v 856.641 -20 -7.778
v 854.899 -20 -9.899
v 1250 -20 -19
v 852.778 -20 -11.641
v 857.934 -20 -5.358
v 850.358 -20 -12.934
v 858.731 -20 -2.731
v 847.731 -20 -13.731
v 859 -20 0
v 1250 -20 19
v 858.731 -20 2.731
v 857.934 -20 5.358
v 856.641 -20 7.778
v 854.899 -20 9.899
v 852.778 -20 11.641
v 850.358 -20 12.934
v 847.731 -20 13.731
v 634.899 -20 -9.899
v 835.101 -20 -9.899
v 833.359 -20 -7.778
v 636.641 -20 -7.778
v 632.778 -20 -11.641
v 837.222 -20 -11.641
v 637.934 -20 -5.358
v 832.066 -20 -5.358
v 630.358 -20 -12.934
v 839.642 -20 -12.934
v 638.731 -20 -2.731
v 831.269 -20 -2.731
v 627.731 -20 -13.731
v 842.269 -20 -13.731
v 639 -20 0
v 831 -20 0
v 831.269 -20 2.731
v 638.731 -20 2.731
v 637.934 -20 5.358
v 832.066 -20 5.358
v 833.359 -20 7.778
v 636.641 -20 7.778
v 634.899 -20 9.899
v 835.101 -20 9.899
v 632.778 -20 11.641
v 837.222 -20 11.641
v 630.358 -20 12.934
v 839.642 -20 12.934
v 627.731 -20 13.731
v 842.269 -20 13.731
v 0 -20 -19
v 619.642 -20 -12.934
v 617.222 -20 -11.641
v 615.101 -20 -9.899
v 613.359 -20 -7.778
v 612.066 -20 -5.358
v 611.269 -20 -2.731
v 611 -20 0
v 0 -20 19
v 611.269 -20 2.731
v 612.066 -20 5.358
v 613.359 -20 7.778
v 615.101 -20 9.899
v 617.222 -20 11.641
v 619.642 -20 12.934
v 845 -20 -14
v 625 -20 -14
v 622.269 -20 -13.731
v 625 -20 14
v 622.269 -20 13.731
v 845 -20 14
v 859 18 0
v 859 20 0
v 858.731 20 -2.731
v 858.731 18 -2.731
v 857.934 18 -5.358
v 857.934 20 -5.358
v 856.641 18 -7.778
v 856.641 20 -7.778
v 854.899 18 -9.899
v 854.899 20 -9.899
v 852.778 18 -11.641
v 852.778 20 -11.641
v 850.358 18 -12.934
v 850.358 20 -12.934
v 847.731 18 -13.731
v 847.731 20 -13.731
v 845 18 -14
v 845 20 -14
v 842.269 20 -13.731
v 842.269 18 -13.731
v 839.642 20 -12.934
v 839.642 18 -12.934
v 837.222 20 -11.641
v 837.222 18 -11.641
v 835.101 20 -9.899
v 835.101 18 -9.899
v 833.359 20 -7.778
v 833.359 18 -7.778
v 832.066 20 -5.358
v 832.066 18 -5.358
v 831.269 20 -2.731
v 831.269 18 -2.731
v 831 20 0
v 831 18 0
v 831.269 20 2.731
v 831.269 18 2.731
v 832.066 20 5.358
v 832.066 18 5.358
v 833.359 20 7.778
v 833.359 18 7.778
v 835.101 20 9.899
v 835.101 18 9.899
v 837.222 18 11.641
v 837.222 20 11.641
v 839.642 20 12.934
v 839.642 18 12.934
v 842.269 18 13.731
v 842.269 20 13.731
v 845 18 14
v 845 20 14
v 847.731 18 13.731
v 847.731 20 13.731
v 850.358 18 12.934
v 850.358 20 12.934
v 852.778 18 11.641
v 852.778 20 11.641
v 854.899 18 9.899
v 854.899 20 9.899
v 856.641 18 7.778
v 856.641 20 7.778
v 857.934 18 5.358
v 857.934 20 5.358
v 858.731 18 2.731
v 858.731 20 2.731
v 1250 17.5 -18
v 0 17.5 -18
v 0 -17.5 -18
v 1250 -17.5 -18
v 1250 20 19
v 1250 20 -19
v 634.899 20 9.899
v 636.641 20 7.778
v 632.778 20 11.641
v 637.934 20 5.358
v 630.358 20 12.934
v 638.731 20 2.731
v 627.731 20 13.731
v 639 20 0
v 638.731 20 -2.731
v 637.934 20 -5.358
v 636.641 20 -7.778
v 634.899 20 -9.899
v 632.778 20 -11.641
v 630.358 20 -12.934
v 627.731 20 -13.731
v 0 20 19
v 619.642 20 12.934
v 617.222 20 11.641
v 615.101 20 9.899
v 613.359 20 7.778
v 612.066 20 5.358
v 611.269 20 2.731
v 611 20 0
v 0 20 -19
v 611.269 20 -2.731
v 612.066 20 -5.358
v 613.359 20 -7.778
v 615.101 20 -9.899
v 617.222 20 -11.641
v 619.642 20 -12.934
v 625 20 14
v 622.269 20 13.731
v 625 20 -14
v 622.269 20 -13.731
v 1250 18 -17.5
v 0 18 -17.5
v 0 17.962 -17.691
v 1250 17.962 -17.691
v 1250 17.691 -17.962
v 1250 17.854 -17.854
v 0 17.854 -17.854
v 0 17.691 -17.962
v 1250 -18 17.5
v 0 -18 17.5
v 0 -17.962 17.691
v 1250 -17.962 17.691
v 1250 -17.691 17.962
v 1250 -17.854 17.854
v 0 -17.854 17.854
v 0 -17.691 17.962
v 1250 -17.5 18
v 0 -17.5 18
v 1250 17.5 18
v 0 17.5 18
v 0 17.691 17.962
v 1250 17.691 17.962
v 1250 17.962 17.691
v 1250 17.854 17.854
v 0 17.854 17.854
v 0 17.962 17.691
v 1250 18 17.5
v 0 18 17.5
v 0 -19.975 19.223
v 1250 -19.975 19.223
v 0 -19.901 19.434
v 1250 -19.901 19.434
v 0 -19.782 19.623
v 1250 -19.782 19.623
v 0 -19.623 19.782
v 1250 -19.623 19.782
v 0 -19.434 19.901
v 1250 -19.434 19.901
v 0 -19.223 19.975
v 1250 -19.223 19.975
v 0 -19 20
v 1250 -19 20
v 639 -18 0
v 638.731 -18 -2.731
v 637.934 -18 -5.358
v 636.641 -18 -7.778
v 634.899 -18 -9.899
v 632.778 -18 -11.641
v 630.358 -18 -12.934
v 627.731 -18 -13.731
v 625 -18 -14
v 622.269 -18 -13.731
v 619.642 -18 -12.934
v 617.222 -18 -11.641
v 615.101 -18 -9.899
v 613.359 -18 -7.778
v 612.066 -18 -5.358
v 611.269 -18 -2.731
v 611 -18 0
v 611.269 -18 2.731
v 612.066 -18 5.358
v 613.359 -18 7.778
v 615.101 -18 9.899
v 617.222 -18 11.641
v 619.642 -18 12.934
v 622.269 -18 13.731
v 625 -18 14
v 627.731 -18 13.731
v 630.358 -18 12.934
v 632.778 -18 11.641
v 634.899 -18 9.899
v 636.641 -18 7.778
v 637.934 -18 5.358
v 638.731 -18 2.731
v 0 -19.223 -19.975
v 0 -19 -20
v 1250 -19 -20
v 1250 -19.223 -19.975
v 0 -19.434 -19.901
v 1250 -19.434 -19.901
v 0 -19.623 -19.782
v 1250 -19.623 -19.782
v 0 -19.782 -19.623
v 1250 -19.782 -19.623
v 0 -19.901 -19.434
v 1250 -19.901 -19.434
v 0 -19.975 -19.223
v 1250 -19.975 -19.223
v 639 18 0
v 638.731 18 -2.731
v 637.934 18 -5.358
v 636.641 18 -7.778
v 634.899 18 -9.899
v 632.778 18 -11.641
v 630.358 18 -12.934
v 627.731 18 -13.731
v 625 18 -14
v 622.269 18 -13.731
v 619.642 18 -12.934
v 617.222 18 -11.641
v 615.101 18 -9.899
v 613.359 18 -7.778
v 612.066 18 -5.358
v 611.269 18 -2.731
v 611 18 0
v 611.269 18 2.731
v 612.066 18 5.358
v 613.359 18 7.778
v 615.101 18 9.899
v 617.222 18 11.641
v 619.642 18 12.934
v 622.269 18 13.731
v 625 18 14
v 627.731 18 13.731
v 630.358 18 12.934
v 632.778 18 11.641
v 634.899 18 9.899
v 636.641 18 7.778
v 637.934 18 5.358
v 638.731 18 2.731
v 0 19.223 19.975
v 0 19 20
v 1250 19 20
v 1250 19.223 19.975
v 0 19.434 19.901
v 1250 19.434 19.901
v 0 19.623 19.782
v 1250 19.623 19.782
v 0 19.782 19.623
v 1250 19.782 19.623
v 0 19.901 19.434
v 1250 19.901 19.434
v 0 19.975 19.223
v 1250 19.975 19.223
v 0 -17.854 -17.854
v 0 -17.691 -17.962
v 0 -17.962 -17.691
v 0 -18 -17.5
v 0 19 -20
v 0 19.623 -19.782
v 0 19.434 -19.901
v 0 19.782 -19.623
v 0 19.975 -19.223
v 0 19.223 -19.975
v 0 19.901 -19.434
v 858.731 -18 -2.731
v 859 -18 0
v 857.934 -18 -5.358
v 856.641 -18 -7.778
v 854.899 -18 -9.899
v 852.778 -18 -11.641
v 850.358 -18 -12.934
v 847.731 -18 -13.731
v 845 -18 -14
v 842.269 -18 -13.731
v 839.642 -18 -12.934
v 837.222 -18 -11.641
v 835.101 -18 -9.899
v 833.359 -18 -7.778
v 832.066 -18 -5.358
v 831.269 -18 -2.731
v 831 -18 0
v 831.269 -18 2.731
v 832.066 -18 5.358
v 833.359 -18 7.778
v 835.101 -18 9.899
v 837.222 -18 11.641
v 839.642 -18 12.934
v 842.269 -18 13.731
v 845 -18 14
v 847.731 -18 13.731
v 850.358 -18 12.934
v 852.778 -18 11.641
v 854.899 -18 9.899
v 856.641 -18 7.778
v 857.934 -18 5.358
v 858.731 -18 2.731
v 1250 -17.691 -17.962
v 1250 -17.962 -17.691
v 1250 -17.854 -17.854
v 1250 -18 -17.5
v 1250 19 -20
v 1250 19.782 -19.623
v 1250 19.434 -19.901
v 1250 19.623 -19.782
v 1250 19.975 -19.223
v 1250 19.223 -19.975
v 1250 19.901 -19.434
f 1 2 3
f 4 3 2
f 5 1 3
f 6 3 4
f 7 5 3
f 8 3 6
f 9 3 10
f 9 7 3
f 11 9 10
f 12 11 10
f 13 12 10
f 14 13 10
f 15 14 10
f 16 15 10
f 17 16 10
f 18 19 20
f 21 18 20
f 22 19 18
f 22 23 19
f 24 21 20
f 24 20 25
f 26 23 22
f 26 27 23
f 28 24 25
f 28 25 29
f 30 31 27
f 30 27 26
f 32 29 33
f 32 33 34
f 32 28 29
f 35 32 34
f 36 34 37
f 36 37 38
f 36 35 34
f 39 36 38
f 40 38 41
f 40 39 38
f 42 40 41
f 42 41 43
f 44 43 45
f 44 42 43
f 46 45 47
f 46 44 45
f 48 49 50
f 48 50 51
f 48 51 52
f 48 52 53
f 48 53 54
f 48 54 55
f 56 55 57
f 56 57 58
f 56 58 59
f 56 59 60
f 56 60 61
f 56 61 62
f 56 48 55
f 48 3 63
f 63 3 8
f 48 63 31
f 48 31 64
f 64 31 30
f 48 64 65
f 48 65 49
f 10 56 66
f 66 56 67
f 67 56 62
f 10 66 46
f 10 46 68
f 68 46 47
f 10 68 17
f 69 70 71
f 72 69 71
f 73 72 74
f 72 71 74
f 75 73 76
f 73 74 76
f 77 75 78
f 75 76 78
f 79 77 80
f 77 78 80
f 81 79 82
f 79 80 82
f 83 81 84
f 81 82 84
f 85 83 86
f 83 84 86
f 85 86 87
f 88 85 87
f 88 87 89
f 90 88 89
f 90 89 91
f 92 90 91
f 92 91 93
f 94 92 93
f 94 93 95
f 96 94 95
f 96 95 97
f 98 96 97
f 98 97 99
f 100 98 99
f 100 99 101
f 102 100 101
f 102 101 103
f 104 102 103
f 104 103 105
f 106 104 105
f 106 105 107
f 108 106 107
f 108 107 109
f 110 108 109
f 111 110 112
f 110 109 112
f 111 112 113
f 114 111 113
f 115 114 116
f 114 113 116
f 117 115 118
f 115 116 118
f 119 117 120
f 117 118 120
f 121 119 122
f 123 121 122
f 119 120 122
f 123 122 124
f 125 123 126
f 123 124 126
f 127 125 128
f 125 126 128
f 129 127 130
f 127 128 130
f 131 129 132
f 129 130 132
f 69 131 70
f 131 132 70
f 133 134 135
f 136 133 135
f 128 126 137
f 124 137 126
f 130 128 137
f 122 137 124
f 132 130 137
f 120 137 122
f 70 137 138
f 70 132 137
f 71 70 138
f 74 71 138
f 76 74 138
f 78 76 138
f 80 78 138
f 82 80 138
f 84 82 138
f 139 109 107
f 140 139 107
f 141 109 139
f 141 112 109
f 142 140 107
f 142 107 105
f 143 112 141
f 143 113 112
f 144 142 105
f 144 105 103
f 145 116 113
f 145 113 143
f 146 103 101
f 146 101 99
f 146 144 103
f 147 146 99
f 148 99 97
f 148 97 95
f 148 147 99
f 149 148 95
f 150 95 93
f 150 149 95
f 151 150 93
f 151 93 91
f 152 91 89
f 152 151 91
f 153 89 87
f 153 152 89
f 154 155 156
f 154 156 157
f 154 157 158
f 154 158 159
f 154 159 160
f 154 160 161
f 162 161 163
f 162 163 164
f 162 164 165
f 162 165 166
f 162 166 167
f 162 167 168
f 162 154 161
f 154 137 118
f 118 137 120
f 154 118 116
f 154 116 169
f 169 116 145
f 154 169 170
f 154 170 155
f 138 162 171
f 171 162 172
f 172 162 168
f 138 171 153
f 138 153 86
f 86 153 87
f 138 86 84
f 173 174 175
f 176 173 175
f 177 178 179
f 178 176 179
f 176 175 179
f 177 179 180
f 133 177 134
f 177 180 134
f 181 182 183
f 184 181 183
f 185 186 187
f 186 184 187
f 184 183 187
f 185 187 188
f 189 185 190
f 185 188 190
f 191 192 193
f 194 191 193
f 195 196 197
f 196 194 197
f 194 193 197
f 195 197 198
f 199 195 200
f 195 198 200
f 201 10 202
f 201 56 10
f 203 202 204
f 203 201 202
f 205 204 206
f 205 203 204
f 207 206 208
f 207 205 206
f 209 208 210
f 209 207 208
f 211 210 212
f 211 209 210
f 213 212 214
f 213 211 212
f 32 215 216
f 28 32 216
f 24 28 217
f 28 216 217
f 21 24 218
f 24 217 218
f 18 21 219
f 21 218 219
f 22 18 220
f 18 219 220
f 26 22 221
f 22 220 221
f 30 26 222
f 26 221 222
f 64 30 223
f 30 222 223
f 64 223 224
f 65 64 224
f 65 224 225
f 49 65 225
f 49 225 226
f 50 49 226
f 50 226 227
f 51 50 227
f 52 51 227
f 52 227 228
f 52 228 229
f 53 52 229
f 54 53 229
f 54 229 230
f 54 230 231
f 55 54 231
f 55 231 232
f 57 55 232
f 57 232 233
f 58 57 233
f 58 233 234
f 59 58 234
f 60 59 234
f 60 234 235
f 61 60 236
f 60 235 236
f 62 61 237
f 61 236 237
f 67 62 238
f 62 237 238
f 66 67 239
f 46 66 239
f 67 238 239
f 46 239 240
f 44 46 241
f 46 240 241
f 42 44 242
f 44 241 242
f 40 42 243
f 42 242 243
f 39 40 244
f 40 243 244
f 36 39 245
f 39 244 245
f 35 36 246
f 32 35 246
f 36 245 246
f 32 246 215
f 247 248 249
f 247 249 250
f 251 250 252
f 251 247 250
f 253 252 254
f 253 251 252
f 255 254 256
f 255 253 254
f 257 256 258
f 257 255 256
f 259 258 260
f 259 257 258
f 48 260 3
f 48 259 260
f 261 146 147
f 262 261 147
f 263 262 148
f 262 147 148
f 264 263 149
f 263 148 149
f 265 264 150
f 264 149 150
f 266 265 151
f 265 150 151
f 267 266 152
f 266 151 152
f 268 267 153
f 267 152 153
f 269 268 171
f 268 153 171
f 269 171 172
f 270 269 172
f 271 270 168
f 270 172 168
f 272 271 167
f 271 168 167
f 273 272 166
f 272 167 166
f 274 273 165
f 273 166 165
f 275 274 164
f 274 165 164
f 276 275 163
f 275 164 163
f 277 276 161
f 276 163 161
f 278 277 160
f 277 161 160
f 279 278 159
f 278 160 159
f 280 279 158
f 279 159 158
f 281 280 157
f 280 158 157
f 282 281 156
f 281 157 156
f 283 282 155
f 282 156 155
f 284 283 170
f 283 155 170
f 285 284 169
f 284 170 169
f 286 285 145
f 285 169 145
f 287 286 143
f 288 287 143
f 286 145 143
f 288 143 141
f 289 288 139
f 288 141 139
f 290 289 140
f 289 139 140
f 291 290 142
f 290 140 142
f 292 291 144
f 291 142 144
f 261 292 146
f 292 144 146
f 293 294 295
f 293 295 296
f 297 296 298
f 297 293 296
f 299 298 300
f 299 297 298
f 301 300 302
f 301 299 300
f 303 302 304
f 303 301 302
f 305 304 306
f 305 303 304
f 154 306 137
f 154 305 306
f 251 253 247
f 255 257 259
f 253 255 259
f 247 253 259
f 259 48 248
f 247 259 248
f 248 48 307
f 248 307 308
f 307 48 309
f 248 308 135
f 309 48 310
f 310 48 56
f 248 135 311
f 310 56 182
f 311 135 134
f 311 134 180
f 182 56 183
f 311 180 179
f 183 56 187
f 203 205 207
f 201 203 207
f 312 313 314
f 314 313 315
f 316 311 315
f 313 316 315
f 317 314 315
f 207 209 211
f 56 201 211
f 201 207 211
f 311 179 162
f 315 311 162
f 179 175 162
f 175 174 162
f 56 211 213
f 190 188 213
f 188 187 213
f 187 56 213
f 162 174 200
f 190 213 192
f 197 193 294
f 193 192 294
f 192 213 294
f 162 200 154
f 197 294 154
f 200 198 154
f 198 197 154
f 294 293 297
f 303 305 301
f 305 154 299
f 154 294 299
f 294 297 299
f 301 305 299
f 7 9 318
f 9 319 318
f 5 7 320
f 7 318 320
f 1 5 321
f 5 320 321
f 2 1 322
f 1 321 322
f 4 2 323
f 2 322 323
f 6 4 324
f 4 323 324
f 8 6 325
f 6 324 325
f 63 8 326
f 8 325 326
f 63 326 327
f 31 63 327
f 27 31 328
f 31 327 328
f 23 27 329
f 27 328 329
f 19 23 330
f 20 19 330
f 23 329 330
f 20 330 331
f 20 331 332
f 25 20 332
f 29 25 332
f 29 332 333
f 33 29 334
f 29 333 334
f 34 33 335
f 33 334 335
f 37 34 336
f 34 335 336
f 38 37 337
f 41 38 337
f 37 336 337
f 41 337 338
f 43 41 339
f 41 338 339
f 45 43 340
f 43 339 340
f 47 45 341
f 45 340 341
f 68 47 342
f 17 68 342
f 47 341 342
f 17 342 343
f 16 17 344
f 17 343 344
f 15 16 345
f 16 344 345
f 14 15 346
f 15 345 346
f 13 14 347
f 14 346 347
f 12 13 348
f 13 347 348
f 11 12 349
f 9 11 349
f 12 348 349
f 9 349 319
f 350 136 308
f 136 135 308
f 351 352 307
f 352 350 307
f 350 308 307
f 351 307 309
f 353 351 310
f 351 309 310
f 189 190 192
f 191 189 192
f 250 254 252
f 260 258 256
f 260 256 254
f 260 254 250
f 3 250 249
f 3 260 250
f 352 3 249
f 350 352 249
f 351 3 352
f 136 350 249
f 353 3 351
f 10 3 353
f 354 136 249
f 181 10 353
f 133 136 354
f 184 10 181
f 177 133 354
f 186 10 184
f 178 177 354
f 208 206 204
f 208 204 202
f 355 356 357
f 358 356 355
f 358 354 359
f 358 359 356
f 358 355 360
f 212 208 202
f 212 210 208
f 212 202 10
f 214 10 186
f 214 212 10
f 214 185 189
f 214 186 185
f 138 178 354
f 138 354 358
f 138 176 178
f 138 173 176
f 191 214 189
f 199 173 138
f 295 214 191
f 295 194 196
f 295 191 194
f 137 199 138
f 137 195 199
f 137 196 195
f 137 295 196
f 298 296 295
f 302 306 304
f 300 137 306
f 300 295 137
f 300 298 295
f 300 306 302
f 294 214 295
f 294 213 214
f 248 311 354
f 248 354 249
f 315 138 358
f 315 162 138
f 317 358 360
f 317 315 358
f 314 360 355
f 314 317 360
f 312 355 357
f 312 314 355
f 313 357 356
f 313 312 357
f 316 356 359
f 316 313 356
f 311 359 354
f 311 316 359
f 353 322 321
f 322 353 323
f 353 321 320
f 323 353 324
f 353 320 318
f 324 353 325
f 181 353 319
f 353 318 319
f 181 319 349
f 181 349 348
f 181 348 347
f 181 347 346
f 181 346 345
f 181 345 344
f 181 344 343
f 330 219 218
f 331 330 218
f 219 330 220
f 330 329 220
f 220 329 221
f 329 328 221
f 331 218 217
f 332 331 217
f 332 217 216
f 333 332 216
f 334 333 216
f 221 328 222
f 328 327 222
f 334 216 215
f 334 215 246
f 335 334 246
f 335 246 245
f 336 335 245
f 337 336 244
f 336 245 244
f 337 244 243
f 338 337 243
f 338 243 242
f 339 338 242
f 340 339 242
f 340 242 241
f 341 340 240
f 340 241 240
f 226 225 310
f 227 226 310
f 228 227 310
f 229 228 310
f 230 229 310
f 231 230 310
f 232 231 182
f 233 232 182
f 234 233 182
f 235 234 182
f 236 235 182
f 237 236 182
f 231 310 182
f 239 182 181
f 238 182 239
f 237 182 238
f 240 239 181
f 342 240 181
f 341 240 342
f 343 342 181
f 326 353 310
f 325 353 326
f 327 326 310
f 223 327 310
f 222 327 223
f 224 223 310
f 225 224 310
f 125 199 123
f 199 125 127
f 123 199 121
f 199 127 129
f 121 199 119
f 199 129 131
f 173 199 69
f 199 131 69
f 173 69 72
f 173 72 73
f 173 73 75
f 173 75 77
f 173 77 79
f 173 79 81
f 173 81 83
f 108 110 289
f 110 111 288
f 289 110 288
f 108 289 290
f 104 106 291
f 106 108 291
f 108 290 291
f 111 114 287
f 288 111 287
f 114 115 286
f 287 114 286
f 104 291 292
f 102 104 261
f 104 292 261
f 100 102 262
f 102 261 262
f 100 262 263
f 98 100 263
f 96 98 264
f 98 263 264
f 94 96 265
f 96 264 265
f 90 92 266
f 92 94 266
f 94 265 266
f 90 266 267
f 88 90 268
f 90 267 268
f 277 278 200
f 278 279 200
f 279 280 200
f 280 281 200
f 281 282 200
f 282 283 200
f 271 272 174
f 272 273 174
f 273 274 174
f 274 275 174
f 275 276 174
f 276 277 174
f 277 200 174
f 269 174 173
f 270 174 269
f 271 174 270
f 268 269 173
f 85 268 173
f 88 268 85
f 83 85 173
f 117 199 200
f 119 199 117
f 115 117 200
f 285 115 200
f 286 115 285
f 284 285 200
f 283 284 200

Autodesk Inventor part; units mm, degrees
ref_plane "YZ Plane" through (0, 0, 0) normal (1, 0, 0) x (0, 1, 0)
ref_plane "XZ Plane" through (0, 0, 0) normal (0, 1, 0) x (-1, 0, 0)
ref_plane "XY Plane" through (0, 0, 0) normal (0, 0, 1) x (1, 0, 0)
sketch "Skizze1" plane through (0, 0, 0) normal (1, 0, 0) x (0, 1, 0)
  line L0 (-19, 20) -> (19, 20)
  line L1 (20, 19) -> (20, -19)
  line L2 (19, -20) -> (-19, -20)
  line L3 (-20, -19) -> (-20, 19)
  line L4 (-20, 20) -> (20, -20) construction
  line L5 (20, 20) -> (-20, -20) construction
  line L6 (-17.5, 18) -> (17.5, 18)
  line L7 (18, 17.5) -> (18, -17.5)
  line L8 (17.5, -18) -> (-17.5, -18)
  line L9 (-18, -17.5) -> (-18, 17.5)
  line L10 (-18, 18) -> (18, -18) construction
  line L11 (18, 18) -> (-18, -18) construction
  arc A0 (20, 19) -> (19, 20) centre (19, 19) ccw
  arc A1 (-19, 20) -> (-20, 19) centre (-19, 19) ccw
  arc A2 (-20, -19) -> (-19, -20) centre (-19, -19) ccw
  arc A3 (19, -20) -> (20, -19) centre (19, -19) ccw
  arc A4 (18, 17.5) -> (17.5, 18) centre (17.5, 17.5) ccw
  arc A5 (-17.5, 18) -> (-18, 17.5) centre (-17.5, 17.5) ccw
  arc A6 (-18, -17.5) -> (-17.5, -18) centre (-17.5, -17.5) ccw
  arc A7 (17.5, -18) -> (18, -17.5) centre (17.5, -17.5) ccw
  point P0 (0, 0)
  dimension "d0" = 40
  dimension "d1" = 40
  dimension "d2" = 36
  dimension "d3" = 36
  dimension "d4" = 1
  dimension "d5" = 0.5
extrude "Extrusion1" add sketch "Skizze1" along normal blind 1250
sketch "Skizze2" plane through (0, 20, 19) normal (0, 1, 0) x (1, 0, 0)
  line L0 (0, 19) -> (425, 19)
  line L1 (425, 19) -> (845, 19)
  circle A0 centre (845, 19) radius 14
  line L2 (0, 19) -> (635, 19)
  line L3 (0, 19) -> (625, 19)
  circle A1 centre (625, 19) radius 14
  dimension "d8" = 425
  dimension "d10" = 420
  dimension "d11" = 28
  dimension "d15" = 28
extrude "Extrusion2" cut sketch "Skizze2" against normal through all
properties part number "richtungstange" material "Aluminium 6061"
